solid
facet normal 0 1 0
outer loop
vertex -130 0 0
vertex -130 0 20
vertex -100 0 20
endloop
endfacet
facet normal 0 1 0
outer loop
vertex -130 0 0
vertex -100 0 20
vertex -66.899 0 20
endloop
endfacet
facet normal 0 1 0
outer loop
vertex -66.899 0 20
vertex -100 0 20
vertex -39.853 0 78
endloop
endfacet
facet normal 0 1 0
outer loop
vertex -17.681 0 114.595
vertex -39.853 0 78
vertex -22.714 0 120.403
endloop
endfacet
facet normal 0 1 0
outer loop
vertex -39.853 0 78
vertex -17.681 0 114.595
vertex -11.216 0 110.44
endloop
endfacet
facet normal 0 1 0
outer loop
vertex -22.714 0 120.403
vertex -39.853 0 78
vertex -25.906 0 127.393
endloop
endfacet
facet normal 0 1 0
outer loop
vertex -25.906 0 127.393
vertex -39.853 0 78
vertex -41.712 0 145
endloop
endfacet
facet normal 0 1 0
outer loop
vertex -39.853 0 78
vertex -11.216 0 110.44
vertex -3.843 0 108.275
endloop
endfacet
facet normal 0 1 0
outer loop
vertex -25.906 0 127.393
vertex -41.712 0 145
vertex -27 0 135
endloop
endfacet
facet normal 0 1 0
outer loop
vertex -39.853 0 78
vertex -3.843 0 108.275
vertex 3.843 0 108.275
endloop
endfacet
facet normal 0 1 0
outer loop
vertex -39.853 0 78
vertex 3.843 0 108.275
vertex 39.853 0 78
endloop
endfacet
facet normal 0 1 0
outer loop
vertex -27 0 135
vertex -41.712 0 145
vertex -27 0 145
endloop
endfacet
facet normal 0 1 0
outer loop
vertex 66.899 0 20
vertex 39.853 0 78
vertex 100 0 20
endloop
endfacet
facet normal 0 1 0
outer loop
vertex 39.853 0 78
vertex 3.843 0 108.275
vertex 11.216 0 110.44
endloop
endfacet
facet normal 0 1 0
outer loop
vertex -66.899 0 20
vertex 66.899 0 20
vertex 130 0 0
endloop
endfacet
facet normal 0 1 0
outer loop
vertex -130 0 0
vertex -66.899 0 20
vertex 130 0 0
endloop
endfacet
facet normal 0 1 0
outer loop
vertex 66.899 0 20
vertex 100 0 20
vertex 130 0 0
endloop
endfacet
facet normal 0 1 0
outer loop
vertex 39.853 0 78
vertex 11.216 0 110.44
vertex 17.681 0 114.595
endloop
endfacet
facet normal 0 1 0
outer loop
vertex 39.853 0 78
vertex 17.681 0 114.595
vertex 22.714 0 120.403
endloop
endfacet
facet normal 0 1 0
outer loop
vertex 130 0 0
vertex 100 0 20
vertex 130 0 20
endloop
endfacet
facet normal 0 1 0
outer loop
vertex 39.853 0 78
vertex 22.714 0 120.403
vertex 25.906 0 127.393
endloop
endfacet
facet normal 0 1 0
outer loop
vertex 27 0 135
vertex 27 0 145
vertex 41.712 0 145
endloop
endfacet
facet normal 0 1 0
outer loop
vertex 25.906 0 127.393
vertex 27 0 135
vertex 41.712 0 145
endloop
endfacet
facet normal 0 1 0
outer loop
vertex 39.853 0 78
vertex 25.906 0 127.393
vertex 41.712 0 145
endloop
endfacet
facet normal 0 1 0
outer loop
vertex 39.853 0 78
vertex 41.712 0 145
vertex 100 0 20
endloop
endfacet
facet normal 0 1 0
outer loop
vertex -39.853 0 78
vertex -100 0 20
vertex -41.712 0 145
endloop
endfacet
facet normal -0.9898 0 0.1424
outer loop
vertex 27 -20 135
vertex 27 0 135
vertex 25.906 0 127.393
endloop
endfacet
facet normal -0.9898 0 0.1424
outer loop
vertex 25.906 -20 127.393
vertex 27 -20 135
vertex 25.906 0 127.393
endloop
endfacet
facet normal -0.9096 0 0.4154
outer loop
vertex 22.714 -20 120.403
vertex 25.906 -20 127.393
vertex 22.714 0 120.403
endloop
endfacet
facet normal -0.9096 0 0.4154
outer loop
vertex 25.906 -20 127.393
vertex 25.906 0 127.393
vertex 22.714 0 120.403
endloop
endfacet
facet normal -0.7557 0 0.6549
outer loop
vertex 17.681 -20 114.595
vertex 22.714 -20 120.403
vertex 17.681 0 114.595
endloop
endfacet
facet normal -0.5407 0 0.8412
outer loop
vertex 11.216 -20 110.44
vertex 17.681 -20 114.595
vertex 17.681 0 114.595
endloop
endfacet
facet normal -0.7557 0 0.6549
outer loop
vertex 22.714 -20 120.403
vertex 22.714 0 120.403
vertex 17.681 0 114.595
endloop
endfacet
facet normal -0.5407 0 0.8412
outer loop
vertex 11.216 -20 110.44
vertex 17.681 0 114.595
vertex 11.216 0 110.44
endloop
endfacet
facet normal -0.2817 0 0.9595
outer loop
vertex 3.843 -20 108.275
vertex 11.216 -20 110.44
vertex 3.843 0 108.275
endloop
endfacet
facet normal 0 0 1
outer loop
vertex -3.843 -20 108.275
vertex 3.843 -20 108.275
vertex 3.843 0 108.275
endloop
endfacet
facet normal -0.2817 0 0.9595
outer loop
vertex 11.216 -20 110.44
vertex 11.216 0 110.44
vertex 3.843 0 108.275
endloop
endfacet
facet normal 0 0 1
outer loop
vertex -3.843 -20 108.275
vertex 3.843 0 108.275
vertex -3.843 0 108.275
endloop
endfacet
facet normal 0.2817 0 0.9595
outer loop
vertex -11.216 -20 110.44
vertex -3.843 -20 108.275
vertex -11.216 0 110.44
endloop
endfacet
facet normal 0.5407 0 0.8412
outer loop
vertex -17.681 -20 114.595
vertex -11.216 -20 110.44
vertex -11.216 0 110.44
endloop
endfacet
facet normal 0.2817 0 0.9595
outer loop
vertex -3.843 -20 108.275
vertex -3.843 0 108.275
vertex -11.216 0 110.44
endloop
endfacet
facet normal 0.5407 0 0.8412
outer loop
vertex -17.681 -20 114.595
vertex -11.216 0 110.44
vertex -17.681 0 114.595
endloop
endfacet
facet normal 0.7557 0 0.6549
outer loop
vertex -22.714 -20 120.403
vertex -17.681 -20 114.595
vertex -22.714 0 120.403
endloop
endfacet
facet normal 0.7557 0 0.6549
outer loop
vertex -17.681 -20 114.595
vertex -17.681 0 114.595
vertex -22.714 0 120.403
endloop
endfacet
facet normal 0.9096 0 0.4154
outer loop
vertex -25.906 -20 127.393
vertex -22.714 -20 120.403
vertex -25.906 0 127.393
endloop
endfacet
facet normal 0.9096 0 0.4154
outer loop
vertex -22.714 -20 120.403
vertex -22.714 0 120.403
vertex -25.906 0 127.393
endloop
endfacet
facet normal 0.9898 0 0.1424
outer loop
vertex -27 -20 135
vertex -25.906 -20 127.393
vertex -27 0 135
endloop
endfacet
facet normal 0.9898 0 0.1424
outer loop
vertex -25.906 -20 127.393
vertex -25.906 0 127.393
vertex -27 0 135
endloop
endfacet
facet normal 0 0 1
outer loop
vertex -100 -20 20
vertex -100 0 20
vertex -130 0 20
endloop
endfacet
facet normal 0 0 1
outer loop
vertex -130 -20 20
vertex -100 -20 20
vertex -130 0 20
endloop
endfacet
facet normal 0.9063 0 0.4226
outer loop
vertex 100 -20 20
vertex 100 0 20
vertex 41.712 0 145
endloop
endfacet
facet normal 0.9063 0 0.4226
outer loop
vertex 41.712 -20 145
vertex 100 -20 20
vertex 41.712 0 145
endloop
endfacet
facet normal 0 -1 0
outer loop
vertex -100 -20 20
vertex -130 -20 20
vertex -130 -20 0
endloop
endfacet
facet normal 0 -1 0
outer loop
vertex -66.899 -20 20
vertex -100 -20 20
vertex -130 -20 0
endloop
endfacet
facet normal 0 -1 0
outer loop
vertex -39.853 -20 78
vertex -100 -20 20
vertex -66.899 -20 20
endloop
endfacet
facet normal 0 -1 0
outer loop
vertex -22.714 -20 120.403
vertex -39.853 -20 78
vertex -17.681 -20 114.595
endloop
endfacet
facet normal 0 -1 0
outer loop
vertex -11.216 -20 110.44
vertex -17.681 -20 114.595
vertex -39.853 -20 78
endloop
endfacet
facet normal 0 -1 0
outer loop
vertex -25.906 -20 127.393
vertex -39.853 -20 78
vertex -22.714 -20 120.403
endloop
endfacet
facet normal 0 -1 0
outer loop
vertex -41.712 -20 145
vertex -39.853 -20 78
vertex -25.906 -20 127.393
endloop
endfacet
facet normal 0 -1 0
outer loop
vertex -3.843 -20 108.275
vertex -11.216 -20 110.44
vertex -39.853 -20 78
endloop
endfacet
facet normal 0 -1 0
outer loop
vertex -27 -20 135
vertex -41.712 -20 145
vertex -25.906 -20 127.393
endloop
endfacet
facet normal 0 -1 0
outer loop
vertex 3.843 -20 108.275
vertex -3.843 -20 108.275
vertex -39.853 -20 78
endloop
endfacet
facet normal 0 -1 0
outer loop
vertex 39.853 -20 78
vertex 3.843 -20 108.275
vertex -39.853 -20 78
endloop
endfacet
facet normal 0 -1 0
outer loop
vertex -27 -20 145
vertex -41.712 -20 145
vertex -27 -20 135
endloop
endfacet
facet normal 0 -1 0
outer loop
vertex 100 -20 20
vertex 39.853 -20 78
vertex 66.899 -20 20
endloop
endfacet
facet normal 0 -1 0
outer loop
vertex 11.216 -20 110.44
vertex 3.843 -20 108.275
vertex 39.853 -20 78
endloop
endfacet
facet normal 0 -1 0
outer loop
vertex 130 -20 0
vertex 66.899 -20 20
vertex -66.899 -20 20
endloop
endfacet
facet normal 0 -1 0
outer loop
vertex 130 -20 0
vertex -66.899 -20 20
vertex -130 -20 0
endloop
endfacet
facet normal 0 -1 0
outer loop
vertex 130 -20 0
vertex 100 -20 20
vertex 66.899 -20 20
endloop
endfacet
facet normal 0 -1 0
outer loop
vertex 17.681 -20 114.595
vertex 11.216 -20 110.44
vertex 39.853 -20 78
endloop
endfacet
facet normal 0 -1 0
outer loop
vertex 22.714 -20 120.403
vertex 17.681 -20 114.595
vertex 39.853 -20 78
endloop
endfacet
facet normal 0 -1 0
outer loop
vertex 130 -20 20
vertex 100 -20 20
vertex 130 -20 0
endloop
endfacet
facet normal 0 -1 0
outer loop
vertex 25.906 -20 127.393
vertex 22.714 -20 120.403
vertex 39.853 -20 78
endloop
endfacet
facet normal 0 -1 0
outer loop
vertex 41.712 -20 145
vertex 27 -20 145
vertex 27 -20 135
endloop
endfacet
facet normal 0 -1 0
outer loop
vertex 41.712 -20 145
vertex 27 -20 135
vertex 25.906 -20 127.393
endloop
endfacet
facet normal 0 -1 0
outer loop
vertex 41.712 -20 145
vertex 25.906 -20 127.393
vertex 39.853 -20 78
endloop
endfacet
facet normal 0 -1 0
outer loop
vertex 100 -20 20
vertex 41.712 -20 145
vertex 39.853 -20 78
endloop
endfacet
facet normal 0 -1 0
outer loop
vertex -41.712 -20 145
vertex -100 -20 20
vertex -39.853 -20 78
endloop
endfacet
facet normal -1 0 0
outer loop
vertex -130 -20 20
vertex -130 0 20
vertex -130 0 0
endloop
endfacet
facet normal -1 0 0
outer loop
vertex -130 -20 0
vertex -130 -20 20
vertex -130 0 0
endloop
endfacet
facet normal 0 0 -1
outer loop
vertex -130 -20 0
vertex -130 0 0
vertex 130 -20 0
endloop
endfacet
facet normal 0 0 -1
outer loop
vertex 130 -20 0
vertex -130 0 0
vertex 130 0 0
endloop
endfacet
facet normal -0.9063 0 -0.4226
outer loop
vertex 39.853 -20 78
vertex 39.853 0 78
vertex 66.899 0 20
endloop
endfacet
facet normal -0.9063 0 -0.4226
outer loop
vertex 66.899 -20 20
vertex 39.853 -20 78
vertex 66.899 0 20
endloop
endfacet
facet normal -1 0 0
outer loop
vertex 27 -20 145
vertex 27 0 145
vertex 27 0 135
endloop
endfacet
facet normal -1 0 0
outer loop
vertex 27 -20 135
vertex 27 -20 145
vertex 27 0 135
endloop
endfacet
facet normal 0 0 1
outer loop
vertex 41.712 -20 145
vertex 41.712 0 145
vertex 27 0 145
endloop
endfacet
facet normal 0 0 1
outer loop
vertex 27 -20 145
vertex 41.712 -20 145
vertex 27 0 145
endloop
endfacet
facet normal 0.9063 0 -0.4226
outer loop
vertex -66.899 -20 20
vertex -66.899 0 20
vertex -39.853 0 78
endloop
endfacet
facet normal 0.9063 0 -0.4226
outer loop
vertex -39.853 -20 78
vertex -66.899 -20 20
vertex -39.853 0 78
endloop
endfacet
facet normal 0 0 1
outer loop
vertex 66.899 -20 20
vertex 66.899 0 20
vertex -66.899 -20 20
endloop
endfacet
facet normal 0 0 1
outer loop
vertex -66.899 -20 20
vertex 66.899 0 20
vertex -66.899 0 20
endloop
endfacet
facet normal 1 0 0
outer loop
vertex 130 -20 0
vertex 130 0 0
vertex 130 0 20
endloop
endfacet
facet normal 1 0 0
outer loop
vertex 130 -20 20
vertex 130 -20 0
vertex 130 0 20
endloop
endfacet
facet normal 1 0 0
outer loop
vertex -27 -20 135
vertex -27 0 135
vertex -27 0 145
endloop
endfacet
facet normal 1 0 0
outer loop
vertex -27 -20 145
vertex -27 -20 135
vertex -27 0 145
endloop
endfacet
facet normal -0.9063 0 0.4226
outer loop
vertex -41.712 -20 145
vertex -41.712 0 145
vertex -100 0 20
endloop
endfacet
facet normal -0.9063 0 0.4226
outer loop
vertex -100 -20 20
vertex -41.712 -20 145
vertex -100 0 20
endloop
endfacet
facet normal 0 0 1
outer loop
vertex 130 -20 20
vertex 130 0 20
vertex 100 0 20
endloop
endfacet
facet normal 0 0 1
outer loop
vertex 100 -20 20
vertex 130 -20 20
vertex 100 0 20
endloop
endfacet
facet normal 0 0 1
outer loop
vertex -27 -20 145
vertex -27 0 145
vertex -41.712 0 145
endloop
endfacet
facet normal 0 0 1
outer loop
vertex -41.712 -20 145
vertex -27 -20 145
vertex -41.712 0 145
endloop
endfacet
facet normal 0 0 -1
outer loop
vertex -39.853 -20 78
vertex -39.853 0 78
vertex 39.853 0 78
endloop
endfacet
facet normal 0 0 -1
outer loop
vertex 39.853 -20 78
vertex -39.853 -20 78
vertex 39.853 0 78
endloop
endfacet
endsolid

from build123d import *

# Parameters (mm, degrees)
F2_DEPTH = 20


with BuildPart() as f2:
    # F1 (on Front) → F2 (new body)
    with BuildSketch(Plane.XZ):
        with BuildLine():
            Line((-130, 20), (-130, 0))
            Line((-130, 0), (130, 0))
            Line((130, 0), (130, 20))
            Line((130, 20), (100, 20))
            Line((100, 20), (41.711543, 145))
            Line((41.711543, 145), (27, 145))
            Line((27, 145), (27, 135))
            ThreePointArc((27, 135), (0, 108), (-27, 135))
            Line((-27, 135), (-27, 145))
            Line((-27, 145), (-41.711543, 145))
            Line((-41.711543, 145), (-100, 20))
            Line((-100, 20), (-130, 20))
        make_face()
        Polygon((66.898662, 20), (-66.898662, 20), (-39.852818, 78), (39.852818, 78), align=None, mode=Mode.SUBTRACT)
    extrude(amount=F2_DEPTH)


solid = f2.part
